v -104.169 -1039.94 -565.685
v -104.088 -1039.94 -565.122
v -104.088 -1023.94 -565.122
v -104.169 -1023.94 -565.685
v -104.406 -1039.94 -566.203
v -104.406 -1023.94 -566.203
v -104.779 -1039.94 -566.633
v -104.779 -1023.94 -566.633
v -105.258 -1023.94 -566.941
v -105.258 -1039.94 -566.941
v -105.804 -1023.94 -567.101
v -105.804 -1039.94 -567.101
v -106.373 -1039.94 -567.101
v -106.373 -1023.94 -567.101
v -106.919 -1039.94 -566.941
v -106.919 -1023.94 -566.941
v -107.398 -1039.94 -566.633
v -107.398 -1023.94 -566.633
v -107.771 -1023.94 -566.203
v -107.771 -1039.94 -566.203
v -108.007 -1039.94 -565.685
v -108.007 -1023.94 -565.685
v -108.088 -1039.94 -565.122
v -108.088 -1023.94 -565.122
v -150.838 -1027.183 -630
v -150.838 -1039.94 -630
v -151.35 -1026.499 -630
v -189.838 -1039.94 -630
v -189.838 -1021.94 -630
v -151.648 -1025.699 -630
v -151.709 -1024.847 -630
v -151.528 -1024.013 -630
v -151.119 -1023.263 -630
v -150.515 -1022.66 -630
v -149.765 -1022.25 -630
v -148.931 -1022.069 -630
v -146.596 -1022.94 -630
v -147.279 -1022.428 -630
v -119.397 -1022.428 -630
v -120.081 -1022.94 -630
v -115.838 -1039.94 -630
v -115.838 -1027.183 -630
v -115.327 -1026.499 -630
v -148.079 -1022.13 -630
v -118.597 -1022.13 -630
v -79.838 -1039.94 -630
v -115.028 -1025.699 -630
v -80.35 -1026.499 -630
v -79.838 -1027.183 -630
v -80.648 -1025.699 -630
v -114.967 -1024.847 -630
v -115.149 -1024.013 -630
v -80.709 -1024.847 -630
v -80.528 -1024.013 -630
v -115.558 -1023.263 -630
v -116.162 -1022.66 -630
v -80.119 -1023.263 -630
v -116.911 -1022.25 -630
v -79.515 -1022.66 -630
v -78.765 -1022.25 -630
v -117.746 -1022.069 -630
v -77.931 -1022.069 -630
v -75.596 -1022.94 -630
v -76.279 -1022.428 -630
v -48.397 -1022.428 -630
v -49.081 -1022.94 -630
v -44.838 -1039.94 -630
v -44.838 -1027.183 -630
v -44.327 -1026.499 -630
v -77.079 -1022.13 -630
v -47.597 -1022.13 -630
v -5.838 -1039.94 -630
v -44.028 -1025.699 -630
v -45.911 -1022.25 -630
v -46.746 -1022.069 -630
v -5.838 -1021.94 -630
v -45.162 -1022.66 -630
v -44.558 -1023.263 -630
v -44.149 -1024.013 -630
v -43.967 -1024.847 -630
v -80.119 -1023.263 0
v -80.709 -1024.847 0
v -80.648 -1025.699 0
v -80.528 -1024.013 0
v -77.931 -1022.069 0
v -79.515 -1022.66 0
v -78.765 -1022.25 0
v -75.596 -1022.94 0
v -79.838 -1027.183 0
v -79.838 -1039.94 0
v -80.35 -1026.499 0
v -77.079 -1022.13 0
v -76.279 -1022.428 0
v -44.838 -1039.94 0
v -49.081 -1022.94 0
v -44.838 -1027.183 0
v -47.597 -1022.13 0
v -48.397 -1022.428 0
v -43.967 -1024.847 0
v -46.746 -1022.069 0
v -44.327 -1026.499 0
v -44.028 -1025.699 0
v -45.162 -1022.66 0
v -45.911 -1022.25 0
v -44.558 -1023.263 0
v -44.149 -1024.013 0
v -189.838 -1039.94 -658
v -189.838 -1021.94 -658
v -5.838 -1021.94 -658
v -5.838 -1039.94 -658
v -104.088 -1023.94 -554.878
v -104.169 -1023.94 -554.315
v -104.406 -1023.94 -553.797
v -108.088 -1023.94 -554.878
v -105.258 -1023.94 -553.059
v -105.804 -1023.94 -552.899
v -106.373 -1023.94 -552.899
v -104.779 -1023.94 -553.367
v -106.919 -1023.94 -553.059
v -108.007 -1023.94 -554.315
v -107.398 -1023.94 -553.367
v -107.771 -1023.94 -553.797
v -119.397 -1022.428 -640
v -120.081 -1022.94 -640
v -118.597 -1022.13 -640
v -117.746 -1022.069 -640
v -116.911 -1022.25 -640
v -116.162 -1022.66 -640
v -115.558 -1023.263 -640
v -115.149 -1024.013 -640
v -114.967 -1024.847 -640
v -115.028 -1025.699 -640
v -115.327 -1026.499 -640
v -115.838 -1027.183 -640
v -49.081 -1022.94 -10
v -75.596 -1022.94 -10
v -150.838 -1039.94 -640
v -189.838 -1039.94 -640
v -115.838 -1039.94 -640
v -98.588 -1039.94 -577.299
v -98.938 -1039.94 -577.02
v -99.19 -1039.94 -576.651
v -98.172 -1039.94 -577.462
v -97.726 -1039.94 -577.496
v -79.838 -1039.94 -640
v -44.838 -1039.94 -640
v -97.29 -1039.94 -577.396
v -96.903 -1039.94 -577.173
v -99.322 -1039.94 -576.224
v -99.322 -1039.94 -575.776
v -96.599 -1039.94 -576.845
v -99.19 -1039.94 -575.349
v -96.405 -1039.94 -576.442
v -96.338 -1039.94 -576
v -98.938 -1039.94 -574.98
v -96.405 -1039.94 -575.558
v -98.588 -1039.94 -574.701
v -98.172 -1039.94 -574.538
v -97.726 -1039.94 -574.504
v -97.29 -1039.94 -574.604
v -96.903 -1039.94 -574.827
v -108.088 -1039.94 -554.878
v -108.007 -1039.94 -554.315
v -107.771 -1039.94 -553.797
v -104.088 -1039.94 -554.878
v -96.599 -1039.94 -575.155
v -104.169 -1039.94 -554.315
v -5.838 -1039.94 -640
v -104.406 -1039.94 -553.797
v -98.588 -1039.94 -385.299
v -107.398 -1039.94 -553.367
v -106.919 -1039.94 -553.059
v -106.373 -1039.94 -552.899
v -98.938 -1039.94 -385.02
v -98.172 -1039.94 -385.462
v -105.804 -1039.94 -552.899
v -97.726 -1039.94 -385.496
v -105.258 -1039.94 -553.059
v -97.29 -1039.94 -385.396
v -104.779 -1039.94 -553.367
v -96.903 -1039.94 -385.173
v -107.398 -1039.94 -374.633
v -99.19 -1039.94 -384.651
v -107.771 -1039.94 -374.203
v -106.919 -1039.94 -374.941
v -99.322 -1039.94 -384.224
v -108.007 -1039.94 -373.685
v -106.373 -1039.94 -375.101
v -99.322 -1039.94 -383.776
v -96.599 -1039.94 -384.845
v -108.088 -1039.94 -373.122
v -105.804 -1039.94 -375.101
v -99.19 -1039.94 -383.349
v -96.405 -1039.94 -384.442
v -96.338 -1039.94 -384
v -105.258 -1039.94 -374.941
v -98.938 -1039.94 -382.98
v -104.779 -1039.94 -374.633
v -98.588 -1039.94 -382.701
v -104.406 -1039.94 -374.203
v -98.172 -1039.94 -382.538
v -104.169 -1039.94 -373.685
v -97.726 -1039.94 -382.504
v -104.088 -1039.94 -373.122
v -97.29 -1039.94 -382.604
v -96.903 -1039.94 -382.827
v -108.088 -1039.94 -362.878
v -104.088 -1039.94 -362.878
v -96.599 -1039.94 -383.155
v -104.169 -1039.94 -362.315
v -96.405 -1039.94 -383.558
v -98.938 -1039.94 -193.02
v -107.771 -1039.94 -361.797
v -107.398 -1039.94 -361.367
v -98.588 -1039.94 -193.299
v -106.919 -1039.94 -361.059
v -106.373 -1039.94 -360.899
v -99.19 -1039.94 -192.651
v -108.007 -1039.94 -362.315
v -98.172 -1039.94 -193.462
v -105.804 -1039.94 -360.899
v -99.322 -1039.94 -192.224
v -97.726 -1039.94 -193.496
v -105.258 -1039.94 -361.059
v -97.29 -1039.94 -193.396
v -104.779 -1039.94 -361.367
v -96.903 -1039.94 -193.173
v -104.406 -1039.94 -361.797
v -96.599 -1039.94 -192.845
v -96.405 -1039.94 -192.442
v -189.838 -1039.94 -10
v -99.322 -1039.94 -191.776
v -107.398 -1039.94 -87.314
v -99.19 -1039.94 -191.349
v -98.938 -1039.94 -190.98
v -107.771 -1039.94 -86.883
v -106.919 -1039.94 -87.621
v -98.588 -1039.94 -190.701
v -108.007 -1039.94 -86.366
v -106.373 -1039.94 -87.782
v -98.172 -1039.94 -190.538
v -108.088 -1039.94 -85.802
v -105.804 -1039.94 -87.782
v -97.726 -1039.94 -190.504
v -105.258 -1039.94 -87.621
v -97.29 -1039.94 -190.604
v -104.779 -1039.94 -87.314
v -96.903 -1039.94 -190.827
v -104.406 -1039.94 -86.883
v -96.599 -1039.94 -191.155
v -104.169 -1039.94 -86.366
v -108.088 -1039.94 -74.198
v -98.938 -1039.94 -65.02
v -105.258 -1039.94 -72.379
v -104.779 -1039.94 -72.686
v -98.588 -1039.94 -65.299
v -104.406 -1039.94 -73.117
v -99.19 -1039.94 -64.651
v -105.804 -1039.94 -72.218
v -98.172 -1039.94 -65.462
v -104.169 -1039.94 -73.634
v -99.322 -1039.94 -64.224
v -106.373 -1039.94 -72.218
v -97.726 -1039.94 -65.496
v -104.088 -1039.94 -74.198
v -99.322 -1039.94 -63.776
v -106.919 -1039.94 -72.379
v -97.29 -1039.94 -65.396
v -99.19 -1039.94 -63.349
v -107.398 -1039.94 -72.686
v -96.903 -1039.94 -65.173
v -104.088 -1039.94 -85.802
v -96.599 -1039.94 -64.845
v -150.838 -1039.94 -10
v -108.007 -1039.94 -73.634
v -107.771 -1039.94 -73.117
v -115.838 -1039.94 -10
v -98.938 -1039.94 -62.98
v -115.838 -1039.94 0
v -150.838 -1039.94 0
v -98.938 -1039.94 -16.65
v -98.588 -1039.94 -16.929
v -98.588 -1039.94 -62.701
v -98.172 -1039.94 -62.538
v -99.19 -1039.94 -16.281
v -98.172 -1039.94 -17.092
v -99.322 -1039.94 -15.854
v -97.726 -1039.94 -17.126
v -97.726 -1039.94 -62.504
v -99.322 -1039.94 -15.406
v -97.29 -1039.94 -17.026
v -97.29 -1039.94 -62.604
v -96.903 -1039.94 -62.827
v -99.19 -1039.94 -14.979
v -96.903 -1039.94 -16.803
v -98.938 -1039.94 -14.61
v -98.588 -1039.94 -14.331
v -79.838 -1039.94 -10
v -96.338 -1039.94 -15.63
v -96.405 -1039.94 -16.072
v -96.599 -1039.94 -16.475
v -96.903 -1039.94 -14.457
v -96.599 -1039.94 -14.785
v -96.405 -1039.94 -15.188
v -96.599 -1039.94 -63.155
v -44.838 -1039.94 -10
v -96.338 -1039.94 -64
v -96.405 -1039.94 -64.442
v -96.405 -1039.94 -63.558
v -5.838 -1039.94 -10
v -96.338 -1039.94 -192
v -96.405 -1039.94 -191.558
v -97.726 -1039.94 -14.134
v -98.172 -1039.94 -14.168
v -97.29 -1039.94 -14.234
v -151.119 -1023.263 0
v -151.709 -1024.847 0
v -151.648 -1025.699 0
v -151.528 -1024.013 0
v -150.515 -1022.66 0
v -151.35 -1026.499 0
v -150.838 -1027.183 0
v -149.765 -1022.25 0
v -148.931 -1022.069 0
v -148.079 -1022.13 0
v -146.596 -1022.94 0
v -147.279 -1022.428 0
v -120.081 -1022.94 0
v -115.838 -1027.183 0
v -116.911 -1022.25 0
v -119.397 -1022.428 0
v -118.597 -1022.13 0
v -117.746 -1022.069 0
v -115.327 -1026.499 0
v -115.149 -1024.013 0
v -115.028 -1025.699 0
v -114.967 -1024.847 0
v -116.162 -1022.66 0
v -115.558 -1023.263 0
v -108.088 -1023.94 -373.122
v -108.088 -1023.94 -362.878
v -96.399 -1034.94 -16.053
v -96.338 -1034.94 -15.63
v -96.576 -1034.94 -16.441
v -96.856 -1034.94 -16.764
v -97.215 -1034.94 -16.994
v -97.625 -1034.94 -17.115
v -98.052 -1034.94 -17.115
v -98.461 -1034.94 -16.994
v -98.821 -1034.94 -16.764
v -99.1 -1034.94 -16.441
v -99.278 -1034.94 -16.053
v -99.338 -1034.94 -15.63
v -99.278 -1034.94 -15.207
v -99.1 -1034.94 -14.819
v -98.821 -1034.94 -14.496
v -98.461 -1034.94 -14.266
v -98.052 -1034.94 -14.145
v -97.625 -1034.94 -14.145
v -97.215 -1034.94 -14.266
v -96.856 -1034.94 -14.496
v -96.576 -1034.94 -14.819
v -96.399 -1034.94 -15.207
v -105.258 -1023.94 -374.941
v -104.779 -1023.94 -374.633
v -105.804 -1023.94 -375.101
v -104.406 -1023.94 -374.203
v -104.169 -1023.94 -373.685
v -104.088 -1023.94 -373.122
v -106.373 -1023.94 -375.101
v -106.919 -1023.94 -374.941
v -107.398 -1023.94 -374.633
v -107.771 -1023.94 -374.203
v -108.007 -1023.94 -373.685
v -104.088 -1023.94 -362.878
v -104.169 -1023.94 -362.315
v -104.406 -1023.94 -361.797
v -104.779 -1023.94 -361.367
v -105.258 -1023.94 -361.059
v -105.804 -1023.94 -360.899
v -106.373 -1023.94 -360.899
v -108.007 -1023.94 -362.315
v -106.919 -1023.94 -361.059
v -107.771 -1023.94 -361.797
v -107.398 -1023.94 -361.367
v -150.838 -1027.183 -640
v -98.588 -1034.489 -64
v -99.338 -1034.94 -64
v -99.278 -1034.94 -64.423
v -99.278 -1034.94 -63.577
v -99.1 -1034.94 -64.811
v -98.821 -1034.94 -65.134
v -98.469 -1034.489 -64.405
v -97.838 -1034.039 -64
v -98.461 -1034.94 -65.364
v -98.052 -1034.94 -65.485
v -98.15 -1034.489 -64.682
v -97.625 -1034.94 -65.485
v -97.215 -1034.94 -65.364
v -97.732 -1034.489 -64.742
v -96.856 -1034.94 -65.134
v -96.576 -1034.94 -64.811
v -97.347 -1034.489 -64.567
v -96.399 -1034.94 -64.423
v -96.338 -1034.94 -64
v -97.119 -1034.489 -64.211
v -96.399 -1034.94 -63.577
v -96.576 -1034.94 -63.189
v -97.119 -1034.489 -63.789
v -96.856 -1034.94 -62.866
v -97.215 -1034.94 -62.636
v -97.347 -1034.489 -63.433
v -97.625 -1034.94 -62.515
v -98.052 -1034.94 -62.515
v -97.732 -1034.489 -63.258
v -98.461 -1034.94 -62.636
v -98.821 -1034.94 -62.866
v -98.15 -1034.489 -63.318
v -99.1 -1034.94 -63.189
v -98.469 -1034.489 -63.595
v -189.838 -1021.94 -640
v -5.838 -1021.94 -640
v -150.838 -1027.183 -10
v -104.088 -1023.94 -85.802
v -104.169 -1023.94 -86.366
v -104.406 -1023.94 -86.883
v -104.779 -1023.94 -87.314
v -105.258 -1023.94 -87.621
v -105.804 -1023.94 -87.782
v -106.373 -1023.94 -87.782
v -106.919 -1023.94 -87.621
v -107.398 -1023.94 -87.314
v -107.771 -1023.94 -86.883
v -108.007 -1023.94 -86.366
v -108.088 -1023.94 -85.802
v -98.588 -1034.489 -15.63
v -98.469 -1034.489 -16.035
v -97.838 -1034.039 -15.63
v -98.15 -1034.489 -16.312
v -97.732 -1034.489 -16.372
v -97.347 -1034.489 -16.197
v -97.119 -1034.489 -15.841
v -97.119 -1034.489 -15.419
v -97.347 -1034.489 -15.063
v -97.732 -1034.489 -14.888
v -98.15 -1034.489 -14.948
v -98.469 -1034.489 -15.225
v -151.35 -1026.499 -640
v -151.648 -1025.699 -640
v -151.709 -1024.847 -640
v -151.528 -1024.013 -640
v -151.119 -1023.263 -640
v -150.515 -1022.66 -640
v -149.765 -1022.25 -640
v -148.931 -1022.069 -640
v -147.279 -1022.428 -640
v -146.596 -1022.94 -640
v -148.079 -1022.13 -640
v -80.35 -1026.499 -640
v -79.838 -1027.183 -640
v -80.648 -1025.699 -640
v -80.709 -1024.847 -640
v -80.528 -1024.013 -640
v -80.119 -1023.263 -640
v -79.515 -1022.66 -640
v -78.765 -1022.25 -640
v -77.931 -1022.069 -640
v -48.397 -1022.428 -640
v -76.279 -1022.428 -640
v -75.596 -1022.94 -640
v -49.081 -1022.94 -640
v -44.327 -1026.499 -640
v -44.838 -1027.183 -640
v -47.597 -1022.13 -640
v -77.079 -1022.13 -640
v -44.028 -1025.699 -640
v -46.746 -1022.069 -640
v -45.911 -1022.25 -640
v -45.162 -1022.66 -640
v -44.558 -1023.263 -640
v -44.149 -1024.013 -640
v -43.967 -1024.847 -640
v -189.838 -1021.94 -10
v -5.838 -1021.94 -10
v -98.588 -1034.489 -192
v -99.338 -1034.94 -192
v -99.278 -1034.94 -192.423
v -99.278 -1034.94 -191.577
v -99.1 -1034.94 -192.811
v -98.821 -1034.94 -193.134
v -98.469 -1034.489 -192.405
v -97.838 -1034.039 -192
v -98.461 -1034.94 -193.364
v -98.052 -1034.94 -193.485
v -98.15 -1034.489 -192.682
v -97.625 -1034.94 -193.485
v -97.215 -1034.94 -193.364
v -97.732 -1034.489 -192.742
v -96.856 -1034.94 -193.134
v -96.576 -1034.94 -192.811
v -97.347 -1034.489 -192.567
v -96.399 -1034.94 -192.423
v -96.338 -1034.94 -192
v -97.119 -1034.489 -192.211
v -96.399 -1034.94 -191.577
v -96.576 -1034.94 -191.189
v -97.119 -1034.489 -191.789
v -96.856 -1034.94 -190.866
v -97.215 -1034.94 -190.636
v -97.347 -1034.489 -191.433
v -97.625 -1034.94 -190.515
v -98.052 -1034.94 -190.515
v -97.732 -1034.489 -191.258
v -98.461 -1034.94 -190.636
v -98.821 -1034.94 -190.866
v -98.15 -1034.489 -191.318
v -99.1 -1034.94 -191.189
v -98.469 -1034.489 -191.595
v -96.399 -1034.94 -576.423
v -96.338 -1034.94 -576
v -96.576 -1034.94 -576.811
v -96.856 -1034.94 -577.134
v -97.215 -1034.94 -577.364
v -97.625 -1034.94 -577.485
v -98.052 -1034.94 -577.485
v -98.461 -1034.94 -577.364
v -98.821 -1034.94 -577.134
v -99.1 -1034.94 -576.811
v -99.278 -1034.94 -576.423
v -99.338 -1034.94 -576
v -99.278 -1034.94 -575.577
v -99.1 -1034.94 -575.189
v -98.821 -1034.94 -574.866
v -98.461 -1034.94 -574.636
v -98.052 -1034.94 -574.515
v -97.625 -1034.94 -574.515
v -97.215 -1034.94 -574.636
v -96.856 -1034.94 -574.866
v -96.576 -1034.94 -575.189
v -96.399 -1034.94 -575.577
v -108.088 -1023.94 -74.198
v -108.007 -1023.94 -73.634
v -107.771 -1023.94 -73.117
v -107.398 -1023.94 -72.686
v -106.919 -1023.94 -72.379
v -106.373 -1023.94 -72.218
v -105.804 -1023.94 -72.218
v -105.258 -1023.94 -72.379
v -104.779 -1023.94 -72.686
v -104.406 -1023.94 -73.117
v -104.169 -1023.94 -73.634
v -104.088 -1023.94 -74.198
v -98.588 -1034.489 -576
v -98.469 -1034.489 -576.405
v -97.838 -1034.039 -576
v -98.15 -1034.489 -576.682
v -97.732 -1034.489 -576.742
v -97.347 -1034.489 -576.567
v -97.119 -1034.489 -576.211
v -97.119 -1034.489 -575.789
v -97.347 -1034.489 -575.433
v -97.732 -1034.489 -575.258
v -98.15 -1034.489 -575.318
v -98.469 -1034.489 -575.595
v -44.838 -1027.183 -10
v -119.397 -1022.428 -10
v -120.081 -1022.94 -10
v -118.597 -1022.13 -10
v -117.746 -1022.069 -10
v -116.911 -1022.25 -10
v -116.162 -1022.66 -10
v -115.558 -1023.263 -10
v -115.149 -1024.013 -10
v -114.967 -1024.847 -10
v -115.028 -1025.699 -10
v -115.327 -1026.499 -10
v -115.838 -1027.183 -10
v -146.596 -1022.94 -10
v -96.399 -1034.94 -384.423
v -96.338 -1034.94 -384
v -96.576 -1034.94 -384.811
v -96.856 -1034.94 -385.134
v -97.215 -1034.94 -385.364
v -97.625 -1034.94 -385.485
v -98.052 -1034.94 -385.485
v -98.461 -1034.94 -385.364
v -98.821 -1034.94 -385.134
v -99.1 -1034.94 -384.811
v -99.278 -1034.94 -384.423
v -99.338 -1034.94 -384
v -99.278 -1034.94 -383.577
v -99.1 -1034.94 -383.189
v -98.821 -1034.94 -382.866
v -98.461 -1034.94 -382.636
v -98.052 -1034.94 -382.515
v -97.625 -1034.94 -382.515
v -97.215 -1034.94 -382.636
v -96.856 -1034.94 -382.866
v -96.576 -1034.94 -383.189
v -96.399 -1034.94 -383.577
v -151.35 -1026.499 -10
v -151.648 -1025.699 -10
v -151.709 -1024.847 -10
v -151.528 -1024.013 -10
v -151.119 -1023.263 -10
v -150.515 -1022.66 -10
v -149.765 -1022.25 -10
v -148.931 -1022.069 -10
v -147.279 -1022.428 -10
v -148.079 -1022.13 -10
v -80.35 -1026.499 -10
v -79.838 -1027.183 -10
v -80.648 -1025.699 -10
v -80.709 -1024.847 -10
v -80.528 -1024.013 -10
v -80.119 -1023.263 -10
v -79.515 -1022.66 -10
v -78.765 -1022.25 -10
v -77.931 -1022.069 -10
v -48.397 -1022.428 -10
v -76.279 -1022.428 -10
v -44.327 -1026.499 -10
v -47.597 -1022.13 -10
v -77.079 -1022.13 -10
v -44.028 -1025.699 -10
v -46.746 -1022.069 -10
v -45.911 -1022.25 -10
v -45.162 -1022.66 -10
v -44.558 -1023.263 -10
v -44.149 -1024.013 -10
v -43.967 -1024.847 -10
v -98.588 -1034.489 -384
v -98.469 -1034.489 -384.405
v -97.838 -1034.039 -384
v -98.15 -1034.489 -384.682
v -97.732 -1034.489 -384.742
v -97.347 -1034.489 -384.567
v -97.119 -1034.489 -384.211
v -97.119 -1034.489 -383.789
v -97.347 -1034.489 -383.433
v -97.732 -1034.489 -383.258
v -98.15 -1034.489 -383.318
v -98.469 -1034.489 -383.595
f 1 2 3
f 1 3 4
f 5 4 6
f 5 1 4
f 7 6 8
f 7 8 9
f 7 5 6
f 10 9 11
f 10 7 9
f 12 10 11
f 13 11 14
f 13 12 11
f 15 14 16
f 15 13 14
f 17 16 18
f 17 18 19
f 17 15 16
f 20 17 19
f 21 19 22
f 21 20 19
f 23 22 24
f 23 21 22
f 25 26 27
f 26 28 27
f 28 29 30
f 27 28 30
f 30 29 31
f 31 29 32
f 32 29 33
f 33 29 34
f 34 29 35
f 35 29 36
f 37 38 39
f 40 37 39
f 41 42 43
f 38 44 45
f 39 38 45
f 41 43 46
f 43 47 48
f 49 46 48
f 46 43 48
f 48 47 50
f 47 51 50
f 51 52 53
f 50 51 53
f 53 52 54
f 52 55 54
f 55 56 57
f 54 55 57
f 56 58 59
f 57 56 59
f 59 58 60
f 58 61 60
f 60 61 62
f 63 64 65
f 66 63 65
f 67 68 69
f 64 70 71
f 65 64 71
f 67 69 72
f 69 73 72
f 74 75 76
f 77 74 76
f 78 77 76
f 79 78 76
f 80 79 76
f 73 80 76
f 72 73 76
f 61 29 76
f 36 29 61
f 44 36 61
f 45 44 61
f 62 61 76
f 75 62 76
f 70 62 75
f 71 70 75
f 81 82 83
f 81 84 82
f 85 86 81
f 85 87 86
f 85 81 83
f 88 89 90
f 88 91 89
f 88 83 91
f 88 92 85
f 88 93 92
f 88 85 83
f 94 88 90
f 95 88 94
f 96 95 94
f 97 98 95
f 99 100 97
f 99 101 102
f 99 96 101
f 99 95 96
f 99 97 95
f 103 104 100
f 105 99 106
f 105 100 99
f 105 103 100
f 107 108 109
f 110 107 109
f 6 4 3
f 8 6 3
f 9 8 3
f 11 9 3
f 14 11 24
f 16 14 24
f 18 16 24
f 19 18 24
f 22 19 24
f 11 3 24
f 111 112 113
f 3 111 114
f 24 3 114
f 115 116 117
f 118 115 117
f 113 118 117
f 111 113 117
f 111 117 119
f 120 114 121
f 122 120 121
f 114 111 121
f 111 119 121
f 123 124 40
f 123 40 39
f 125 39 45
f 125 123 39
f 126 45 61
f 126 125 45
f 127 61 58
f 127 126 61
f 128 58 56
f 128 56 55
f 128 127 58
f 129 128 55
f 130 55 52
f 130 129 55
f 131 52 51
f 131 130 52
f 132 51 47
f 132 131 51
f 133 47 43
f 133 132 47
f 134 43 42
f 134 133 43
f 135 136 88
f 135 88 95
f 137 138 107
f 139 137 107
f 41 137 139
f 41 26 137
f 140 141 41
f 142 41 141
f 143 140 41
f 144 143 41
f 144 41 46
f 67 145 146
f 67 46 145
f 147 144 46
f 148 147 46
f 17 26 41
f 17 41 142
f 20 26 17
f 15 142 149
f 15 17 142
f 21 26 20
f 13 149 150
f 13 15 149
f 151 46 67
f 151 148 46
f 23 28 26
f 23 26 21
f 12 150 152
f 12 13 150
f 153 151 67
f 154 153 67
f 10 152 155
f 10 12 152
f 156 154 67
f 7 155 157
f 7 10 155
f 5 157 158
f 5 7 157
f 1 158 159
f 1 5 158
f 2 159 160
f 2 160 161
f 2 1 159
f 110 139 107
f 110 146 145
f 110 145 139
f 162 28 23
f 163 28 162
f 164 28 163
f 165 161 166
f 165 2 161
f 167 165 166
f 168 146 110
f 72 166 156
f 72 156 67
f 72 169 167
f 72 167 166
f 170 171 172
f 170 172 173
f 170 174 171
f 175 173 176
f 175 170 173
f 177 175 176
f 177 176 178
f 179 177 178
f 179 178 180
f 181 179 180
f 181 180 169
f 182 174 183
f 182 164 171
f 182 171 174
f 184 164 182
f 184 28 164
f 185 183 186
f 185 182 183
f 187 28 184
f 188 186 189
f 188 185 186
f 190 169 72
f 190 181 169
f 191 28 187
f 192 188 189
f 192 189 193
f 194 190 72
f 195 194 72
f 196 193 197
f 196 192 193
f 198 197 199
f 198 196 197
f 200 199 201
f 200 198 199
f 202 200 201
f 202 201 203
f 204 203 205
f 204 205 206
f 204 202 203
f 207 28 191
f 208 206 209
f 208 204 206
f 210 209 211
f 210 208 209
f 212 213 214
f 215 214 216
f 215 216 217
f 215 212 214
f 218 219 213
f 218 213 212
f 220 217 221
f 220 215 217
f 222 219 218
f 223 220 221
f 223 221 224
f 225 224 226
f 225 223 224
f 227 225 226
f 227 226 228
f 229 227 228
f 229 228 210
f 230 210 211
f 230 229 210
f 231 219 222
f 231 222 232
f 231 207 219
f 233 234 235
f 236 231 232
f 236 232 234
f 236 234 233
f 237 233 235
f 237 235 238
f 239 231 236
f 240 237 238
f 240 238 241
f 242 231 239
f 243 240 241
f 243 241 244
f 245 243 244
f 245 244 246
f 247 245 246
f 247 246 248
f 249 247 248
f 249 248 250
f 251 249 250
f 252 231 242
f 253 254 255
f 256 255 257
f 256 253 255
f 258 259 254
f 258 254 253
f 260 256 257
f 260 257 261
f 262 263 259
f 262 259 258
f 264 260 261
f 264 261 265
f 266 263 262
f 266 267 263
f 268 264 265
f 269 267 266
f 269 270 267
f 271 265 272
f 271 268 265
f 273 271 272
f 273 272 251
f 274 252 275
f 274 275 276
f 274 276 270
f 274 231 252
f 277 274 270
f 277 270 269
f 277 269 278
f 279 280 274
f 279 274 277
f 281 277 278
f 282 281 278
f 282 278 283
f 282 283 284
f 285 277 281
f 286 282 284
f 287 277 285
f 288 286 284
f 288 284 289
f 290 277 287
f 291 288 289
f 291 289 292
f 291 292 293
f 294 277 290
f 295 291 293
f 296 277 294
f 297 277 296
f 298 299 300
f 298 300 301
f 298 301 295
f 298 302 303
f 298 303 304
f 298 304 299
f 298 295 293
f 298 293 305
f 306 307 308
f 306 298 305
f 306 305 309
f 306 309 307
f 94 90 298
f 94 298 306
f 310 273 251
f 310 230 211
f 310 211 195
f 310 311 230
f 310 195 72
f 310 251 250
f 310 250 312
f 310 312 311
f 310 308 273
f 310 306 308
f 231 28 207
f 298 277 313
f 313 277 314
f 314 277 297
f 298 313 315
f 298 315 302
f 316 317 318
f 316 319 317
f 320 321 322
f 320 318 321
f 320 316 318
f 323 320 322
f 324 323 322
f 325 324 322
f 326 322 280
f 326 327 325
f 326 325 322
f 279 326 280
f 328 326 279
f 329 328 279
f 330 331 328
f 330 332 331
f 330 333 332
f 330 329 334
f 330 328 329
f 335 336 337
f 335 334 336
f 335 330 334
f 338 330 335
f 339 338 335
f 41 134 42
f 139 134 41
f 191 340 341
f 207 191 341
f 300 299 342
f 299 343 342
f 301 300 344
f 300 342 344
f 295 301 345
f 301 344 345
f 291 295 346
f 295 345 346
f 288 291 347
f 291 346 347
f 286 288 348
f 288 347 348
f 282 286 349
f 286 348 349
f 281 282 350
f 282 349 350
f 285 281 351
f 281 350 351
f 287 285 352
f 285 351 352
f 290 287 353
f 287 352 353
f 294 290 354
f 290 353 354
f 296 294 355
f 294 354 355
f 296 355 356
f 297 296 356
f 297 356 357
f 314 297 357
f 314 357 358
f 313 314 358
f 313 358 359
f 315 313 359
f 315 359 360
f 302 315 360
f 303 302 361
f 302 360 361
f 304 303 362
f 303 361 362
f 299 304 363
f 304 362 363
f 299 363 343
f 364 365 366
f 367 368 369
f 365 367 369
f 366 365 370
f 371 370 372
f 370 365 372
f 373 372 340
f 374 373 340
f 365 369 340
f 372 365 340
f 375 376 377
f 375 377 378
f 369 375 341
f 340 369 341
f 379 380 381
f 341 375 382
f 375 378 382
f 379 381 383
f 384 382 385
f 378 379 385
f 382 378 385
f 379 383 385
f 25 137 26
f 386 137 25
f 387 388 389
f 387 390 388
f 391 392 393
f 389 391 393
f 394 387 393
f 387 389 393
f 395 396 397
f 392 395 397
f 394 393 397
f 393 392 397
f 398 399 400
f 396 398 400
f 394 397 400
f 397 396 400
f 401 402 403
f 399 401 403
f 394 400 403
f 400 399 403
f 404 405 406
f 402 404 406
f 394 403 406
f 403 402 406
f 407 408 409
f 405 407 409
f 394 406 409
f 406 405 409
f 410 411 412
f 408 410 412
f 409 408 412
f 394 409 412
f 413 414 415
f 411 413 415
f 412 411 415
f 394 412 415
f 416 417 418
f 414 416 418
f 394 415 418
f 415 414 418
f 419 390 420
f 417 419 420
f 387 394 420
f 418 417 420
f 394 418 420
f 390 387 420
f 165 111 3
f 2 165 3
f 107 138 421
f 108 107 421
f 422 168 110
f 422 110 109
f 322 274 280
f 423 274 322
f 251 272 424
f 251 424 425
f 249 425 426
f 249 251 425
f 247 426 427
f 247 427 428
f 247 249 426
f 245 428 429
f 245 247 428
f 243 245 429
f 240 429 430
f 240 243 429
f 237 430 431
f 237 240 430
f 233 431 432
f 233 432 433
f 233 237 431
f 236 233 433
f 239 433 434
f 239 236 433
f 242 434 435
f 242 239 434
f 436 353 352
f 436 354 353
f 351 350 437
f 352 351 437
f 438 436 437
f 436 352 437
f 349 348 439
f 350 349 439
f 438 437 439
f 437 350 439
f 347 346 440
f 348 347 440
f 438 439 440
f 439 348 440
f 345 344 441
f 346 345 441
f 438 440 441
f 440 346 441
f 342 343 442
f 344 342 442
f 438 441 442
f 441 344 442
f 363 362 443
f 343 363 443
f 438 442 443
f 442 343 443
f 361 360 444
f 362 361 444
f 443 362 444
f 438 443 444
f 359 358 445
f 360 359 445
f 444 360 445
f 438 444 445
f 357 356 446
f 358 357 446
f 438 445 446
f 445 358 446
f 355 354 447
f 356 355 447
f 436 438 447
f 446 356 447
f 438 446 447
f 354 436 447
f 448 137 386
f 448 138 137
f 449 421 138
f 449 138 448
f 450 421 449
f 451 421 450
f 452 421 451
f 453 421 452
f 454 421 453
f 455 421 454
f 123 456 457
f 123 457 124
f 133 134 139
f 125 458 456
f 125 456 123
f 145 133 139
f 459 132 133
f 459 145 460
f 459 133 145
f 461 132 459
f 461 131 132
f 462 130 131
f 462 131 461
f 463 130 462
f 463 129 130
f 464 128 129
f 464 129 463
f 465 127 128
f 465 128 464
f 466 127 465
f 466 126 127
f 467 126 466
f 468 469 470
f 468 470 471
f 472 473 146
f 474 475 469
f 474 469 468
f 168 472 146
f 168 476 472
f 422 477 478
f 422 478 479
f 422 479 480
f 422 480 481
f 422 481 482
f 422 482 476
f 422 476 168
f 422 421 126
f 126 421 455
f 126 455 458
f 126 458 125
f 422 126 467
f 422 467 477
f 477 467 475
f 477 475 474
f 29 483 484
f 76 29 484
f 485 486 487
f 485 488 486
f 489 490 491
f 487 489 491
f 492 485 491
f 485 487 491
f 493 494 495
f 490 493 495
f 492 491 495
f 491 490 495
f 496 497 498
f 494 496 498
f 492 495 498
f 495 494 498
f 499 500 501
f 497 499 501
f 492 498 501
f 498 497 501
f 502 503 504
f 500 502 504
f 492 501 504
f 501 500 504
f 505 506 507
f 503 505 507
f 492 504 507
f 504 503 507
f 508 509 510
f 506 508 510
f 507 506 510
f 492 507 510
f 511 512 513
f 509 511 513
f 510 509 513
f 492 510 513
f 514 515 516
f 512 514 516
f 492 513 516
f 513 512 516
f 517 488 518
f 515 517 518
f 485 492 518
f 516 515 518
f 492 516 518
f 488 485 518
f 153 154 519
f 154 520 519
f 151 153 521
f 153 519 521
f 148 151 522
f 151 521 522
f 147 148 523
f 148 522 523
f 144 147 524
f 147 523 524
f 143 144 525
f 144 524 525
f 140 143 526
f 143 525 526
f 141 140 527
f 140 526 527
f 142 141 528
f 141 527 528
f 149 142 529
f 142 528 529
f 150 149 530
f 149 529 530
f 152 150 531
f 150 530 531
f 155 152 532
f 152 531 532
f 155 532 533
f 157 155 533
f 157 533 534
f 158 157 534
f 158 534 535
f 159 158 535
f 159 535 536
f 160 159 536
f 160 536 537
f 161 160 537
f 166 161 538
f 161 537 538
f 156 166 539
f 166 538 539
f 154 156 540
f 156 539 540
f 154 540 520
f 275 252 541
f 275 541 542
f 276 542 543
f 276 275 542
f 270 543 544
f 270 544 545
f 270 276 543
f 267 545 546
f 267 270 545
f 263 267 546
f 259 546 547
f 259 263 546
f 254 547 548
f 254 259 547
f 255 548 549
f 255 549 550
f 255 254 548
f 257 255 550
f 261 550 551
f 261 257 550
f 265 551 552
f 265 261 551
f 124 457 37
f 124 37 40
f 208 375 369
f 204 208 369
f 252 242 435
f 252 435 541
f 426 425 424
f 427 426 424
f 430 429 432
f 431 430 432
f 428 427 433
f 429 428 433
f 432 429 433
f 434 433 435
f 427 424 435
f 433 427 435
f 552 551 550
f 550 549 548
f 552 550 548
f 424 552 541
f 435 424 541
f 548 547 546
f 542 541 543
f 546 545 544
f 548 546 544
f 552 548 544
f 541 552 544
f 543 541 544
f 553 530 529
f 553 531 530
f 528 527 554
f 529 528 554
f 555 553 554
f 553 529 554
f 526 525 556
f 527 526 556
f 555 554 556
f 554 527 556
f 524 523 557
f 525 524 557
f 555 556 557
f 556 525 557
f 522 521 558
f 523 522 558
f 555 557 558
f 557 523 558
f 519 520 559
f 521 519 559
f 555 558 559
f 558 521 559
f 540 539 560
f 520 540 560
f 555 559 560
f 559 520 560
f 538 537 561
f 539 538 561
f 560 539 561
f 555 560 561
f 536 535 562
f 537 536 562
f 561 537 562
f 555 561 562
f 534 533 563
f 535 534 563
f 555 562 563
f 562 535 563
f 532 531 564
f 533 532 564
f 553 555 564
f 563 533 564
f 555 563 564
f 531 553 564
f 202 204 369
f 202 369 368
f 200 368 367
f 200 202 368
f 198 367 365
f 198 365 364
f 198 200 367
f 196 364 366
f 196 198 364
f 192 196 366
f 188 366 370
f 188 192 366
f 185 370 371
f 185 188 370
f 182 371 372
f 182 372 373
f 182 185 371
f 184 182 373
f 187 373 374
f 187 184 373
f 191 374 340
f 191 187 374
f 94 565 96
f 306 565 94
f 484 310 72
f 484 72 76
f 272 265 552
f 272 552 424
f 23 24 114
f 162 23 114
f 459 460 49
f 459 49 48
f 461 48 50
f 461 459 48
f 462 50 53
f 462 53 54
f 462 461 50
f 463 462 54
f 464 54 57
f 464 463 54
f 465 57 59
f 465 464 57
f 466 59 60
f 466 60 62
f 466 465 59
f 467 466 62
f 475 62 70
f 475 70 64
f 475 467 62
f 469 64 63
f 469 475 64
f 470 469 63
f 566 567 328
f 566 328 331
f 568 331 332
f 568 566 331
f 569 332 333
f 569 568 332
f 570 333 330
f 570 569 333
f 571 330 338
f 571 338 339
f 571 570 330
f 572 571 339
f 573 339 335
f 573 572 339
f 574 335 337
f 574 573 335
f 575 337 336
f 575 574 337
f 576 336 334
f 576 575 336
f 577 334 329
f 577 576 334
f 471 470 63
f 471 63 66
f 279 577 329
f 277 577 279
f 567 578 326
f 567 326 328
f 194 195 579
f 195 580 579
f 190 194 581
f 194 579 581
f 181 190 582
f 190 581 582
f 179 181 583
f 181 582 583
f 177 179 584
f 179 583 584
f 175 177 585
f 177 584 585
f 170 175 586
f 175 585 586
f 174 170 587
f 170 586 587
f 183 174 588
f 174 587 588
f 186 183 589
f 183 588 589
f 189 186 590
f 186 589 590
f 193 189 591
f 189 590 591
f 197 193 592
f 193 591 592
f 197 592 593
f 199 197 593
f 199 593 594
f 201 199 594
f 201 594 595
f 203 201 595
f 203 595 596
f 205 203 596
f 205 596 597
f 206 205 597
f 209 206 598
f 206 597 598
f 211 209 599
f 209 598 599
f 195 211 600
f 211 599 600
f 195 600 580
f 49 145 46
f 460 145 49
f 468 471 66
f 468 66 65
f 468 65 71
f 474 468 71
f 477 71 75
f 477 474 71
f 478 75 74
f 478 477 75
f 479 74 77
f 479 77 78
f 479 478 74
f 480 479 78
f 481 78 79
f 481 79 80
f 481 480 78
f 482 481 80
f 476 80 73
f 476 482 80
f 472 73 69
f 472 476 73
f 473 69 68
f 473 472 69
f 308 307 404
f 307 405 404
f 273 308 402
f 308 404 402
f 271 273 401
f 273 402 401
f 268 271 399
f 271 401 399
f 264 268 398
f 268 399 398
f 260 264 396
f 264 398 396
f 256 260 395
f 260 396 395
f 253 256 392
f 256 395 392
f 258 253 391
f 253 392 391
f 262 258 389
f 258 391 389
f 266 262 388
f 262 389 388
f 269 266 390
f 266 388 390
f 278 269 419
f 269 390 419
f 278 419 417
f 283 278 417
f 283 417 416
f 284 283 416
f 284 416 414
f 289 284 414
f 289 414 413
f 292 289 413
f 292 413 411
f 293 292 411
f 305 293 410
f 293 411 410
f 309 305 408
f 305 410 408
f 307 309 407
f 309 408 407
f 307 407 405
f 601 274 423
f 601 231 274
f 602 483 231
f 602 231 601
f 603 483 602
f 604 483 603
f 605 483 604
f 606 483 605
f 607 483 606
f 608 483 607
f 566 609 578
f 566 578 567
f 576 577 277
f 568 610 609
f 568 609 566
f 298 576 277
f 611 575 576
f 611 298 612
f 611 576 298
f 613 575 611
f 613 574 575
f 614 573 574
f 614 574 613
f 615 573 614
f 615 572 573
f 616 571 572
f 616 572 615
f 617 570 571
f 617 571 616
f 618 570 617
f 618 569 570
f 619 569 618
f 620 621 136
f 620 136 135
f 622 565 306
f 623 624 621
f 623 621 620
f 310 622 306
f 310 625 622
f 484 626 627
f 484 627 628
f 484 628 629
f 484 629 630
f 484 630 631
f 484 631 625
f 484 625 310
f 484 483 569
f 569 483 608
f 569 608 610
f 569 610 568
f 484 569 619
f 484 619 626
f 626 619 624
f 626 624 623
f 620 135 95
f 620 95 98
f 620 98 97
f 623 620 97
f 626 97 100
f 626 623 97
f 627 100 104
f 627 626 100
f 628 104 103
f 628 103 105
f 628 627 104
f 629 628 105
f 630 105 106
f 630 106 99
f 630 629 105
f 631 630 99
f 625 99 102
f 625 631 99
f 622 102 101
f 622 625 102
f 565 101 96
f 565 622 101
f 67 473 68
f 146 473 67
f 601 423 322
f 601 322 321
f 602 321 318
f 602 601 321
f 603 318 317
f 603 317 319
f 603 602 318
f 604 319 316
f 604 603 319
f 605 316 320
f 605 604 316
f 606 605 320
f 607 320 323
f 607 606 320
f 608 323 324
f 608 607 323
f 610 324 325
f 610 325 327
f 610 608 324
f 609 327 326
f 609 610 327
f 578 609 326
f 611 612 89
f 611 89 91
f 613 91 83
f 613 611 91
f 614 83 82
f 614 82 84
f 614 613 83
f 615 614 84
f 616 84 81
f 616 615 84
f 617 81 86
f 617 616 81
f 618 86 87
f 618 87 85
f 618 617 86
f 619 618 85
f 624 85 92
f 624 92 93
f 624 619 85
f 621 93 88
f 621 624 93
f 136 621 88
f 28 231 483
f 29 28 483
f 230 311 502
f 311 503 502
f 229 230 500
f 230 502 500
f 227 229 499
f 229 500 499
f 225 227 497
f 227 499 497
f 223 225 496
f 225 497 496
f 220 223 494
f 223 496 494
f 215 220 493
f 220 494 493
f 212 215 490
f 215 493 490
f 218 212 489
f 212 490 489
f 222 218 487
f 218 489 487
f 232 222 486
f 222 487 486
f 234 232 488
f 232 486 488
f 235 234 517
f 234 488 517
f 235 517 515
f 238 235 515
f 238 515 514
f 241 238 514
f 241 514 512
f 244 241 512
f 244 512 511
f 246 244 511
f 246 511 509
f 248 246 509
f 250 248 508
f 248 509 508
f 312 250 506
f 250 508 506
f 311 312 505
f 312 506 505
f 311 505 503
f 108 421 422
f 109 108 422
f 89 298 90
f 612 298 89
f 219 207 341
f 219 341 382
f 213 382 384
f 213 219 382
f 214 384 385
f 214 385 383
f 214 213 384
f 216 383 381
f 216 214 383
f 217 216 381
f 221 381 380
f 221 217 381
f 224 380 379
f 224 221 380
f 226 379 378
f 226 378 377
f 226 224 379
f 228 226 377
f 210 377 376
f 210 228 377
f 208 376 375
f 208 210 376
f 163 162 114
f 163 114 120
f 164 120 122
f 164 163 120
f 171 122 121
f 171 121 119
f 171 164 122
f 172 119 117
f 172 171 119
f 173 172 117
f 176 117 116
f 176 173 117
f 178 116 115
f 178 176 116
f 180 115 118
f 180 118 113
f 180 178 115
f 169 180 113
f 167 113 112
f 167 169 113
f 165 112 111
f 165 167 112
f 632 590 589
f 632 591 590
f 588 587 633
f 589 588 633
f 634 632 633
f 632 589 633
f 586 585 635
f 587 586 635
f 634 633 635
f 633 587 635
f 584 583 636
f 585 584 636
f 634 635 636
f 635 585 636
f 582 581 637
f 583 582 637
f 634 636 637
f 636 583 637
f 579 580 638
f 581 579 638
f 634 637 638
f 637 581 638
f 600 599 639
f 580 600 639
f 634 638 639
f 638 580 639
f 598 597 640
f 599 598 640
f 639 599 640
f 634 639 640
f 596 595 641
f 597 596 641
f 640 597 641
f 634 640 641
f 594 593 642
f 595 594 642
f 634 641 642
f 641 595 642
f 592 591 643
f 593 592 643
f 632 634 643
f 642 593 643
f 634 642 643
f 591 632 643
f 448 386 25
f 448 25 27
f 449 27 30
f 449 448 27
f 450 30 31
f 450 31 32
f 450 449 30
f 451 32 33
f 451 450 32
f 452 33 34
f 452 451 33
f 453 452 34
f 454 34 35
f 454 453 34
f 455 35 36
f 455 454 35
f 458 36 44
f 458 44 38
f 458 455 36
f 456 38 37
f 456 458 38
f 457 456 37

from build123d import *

# Parameters (mm, degrees)
SKETCH1_W                    = 184
SKETCH1_H                    = 18
BOSS_EXTRUDE1_DEPTH          = 658
F_3_0_3_DIAMETER_HOLE2_D     = 3
F_3_0_3_DIAMETER_HOLE2_DEPTH = 5
F_3_0_3_DIAMETER_HOLE2_TIP   = 0.901290929
CUT_EXTRUDE3_DEPTH           = 16
CAVITY1_START                = -640
CAVITY1_DEPTH                = 10
CAVITY1_START_2              = -10
CAVITY1_2_DEPTH              = 10


# Read off the part's stored shape, not the designer's step: Cavity1
with BuildPart() as part:
    # Sketch1 → Boss-Extrude1 (new body)
    with BuildSketch(Plane.XY):
        with Locations((-97.838367622, -1030.94)):
            Rectangle(SKETCH1_W, SKETCH1_H)
    extrude(amount=-BOSS_EXTRUDE1_DEPTH)

    # Ø3.0 (3) Diameter Hole2
    with Locations(Plane(origin=(0, -1039.94, 0), x_dir=(-1, 0, 0), z_dir=(0, -1, 0))):
        with Locations((97.838367622, 64), (97.838367622, 384), (97.838367622, 576), (97.838367622, 192), (97.838367622, 15.63)):
            Hole(F_3_0_3_DIAMETER_HOLE2_D / 2, depth=F_3_0_3_DIAMETER_HOLE2_DEPTH)
            with Locations((0, 0, -(F_3_0_3_DIAMETER_HOLE2_DEPTH + F_3_0_3_DIAMETER_HOLE2_TIP / 2))):  # 118° drill point
                Cone(0, F_3_0_3_DIAMETER_HOLE2_D / 2, F_3_0_3_DIAMETER_HOLE2_TIP, mode=Mode.SUBTRACT)

    # Sketch8 → Cut-Extrude3 (cut)
    with BuildSketch(Plane.XZ.offset(1039.94)):
        with BuildLine():
            Line((-108.088367622, -85.802173793), (-108.088367622, -74.197826207))
            ThreePointArc((-108.088367622, -74.197826207), (-106.088367622, -72.197826207), (-104.088367622, -74.197826207))
            Line((-104.088367622, -74.197826207), (-104.088367622, -85.802173793))
            ThreePointArc((-104.088367622, -85.802173793), (-106.088367622, -87.802173793), (-108.088367622, -85.802173793))
        make_face()
        with BuildLine():
            Line((-108.088367622, -373.121722836), (-108.088367622, -362.878277164))
            ThreePointArc((-108.088367622, -362.878277164), (-106.088367622, -360.878277164), (-104.088367622, -362.878277164))
            Line((-104.088367622, -362.878277164), (-104.088367622, -373.121722836))
            ThreePointArc((-104.088367622, -373.121722836), (-106.088367622, -375.121722836), (-108.088367622, -373.121722836))
        make_face()
        with BuildLine():
            Line((-108.088367622, -565.121722836), (-108.088367622, -554.878277164))
            ThreePointArc((-108.088367622, -554.878277164), (-106.088367622, -552.878277164), (-104.088367622, -554.878277164))
            Line((-104.088367622, -554.878277164), (-104.088367622, -565.121722836))
            ThreePointArc((-104.088367622, -565.121722836), (-106.088367622, -567.121722836), (-108.088367622, -565.121722836))
        make_face()
    extrude(amount=-CUT_EXTRUDE3_DEPTH, mode=Mode.SUBTRACT)

    # Cavity1 outline → Cavity1 (cut)
    with BuildSketch(Plane.XY.offset(CAVITY1_START)):
        with BuildLine():
            Line((-150.838367622, -1039.94), (-150.838367622, -1027.182640687))
            ThreePointArc((-150.838367622, -1027.182640687), (-150.838367621, -1022.94), (-146.595726934, -1022.94))
            Line((-146.595726934, -1022.94), (-120.081008309, -1022.94))
            ThreePointArc((-120.081008309, -1022.94), (-115.838367622, -1022.94), (-115.838367622, -1027.182640687))
            Line((-115.838367622, -1027.182640687), (-115.838367622, -1039.94))
            Line((-115.838367622, -1039.94), (-79.838367622, -1039.94))
            Line((-79.838367622, -1039.94), (-79.838367622, -1027.182640687))
            ThreePointArc((-79.838367622, -1027.182640687), (-79.838367621, -1022.94), (-75.595726934, -1022.94))
            Line((-75.595726934, -1022.94), (-49.081008309, -1022.94))
            ThreePointArc((-49.081008309, -1022.94), (-44.838367622, -1022.94), (-44.838367622, -1027.182640687))
            Line((-44.838367622, -1027.182640687), (-44.838367622, -1039.94))
            Line((-44.838367622, -1039.94), (-5.838367622, -1039.94))
            Line((-5.838367622, -1039.94), (-5.838367622, -1021.94))
            Line((-5.838367622, -1021.94), (-189.838367622, -1021.94))
            Line((-189.838367622, -1021.94), (-189.838367622, -1039.94))
            Line((-189.838367622, -1039.94), (-150.838367622, -1039.94))
        make_face()
    extrude(amount=CAVITY1_DEPTH, mode=Mode.SUBTRACT)

    # Cavity1 2 outline → Cavity1 2 (cut)
    with BuildSketch(Plane.XY.offset(CAVITY1_START_2)):
        with BuildLine():
            Line((-150.838367622, -1039.94), (-150.838367622, -1027.182640687))
            ThreePointArc((-150.838367622, -1027.182640687), (-150.838367621, -1022.94), (-146.595726934, -1022.94))
            Line((-146.595726934, -1022.94), (-120.081008309, -1022.94))
            ThreePointArc((-120.081008309, -1022.94), (-115.838367622, -1022.94), (-115.838367622, -1027.182640687))
            Line((-115.838367622, -1027.182640687), (-115.838367622, -1039.94))
            Line((-115.838367622, -1039.94), (-79.838367622, -1039.94))
            Line((-79.838367622, -1039.94), (-79.838367622, -1027.182640687))
            ThreePointArc((-79.838367622, -1027.182640687), (-79.838367621, -1022.94), (-75.595726934, -1022.94))
            Line((-75.595726934, -1022.94), (-49.081008309, -1022.94))
            ThreePointArc((-49.081008309, -1022.94), (-44.838367622, -1022.94), (-44.838367622, -1027.182640687))
            Line((-44.838367622, -1027.182640687), (-44.838367622, -1039.94))
            Line((-44.838367622, -1039.94), (-5.838367622, -1039.94))
            Line((-5.838367622, -1039.94), (-5.838367622, -1021.94))
            Line((-5.838367622, -1021.94), (-189.838367622, -1021.94))
            Line((-189.838367622, -1021.94), (-189.838367622, -1039.94))
            Line((-189.838367622, -1039.94), (-150.838367622, -1039.94))
        make_face()
    extrude(amount=CAVITY1_2_DEPTH, mode=Mode.SUBTRACT)


solid = part.part
